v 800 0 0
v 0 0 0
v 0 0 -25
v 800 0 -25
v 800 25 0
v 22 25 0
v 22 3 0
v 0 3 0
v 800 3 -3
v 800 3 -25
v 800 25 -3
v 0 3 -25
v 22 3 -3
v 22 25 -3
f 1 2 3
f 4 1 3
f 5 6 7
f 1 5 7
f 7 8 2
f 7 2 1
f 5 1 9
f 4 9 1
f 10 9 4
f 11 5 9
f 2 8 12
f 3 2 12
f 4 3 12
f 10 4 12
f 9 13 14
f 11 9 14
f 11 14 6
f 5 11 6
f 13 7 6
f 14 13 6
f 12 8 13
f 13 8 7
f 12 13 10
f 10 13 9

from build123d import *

# Parameters (mm, degrees)
EXTRUDE_1_DEPTH     = 800
SKETCH_2_W          = 22
SKETCH_2_H          = 22
CUT_EXTRUDE_1_DEPTH = 26


with BuildPart() as part:
    # Эскиз1 → Вытянуть-Тонкостенный1 (new body)
    with BuildSketch(Plane(origin=(0, 0, 0), x_dir=(0, 0, -1), z_dir=(1, 0, 0))):
        Polygon((0, 25), (0, 0), (25, 0), (25, 3), (3, 3), (3, 25), align=None)
    extrude(amount=EXTRUDE_1_DEPTH)

    # Эскиз2 → Вырез-Вытянуть1 (cut, through all)
    with BuildSketch(Plane.XY):
        with Locations((11, 14)):
            Rectangle(SKETCH_2_W, SKETCH_2_H)
    extrude(amount=-CUT_EXTRUDE_1_DEPTH, mode=Mode.SUBTRACT)


solid = part.part
